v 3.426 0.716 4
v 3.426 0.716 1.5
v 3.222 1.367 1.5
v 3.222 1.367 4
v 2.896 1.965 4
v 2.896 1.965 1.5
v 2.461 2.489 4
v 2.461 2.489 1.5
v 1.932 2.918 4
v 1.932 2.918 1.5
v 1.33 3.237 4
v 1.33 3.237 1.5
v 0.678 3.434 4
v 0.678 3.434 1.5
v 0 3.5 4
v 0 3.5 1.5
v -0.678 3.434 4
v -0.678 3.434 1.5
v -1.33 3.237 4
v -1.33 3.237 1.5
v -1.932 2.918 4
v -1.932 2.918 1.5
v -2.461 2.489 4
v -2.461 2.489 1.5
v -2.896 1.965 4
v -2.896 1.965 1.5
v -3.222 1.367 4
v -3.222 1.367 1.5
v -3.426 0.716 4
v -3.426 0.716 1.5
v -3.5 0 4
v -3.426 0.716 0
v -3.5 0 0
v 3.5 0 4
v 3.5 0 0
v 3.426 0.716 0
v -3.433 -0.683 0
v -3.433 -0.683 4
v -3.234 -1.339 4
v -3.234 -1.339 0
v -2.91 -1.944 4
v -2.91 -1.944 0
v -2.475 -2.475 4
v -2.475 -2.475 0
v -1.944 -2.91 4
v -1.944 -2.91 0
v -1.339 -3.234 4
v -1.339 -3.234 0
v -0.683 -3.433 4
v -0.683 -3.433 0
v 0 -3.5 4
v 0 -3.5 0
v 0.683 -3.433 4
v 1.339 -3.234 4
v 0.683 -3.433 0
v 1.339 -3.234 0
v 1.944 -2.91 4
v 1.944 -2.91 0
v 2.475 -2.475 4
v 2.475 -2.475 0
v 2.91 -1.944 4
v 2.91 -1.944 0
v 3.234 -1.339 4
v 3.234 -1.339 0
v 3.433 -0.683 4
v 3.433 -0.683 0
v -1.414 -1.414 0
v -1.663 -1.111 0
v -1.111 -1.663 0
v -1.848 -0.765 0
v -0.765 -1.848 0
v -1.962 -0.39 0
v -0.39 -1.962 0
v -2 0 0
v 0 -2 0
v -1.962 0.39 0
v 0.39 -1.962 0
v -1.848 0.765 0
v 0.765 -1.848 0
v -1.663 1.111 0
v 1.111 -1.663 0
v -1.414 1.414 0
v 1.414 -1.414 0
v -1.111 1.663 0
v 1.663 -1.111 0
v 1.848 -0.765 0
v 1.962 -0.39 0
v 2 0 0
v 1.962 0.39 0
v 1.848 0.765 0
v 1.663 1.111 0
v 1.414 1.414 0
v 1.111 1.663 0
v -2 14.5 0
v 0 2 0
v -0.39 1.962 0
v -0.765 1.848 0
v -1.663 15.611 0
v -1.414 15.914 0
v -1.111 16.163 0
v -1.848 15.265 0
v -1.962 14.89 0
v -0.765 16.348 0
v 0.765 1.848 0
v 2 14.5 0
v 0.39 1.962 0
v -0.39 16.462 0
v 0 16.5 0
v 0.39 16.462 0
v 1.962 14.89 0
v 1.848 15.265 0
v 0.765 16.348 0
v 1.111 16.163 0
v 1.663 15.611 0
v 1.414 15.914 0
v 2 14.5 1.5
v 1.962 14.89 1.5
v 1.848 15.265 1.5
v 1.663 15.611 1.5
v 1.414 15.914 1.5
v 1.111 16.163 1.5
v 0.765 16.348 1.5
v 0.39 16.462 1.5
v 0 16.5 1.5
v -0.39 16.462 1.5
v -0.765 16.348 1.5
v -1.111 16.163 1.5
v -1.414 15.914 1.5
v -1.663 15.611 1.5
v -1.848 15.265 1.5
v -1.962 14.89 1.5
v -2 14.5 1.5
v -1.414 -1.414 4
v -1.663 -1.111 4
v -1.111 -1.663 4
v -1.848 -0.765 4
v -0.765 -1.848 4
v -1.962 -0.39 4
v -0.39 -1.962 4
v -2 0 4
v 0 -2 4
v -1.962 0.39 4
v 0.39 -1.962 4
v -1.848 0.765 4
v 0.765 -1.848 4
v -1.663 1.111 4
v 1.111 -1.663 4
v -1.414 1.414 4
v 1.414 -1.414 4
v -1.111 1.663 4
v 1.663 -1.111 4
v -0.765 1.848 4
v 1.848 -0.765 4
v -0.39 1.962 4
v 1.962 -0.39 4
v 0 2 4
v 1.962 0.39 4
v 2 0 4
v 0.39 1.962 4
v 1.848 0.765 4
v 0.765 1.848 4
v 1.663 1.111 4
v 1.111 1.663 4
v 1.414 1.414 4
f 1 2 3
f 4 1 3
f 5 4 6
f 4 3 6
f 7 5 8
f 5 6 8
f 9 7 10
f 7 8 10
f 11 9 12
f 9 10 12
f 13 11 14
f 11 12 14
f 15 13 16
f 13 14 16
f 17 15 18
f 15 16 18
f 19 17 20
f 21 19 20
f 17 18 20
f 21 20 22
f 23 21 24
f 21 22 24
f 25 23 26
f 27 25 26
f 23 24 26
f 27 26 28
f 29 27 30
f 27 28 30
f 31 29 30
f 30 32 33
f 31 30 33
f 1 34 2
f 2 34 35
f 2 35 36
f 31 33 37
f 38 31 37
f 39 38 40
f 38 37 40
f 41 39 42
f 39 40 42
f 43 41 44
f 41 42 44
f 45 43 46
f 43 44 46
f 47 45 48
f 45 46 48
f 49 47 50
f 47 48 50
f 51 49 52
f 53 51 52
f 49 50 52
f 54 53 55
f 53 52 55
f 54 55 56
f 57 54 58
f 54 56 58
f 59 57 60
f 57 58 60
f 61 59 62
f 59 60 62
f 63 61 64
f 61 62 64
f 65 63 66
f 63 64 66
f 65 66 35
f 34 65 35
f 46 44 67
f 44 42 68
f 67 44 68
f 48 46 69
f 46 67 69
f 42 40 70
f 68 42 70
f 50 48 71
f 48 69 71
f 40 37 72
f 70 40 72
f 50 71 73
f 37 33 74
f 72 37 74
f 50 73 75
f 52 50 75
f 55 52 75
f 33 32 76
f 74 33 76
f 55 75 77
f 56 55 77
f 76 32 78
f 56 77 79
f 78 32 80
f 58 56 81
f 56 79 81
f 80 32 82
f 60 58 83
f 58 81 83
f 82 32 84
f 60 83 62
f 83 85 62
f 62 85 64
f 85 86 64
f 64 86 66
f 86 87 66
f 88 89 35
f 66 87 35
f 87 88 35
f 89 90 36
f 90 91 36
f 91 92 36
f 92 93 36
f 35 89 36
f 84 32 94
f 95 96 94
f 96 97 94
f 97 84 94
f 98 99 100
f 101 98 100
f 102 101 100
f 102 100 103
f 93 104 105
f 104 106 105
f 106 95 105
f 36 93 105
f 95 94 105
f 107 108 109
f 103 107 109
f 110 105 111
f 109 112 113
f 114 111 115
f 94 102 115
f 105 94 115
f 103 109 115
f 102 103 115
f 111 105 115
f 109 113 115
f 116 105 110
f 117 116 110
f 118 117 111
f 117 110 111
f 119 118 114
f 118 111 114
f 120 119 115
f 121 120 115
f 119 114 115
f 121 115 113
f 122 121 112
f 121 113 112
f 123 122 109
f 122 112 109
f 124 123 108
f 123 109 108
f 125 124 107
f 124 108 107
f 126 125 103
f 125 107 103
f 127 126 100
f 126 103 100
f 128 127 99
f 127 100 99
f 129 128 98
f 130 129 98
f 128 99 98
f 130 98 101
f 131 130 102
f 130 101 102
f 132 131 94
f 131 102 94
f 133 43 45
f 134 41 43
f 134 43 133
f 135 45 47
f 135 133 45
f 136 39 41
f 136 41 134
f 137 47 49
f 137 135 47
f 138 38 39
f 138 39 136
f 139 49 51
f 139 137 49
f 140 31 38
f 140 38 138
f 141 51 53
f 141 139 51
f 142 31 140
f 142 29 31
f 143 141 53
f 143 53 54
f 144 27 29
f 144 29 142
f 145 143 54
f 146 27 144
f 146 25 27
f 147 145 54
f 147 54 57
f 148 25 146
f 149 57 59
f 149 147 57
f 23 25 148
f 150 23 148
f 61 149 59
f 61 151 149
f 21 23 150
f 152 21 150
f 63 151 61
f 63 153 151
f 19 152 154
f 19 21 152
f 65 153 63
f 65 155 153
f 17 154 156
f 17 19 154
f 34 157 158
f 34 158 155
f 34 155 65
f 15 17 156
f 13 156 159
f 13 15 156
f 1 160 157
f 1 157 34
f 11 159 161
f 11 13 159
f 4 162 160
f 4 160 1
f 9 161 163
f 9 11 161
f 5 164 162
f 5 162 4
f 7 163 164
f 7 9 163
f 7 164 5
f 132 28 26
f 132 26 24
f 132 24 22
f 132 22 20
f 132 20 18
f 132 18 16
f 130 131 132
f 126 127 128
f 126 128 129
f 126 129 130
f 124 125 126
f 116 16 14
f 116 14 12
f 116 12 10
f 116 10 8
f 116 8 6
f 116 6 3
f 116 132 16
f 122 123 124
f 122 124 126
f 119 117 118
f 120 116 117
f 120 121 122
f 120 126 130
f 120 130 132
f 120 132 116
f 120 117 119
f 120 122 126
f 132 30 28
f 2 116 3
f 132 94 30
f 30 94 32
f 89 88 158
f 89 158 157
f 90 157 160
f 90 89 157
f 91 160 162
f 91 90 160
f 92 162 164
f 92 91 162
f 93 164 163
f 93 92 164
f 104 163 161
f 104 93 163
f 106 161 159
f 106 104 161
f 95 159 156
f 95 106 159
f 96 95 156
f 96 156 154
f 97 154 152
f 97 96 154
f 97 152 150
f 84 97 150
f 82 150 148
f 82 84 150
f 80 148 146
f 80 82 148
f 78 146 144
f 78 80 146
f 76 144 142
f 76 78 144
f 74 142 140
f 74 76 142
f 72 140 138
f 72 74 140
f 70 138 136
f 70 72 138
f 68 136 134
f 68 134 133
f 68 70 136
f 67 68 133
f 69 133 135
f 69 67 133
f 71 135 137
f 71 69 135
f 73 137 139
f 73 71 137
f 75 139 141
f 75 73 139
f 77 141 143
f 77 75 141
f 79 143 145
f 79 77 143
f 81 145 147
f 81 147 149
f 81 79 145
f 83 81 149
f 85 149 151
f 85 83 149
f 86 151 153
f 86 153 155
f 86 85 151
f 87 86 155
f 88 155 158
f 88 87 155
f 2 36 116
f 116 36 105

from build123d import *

# Parameters (mm, degrees)
F1_DEPTH = 1.5
F0_R     = 2
F2_DEPTH = 4


with BuildPart() as f1:
    # F0 (on Top) → F1 (new body)
    with BuildSketch(Plane.XY):
        with BuildLine():
            ThreePointArc((2, 14.5), (0, 16.5), (-2, 14.5))
            ThreePointArc((-2, 14.5), (0, 12.5), (2, 14.5))
        make_face()
        with BuildLine():
            Line((-2, 14.5), (-3.4258823529, 0.7164705882))
            ThreePointArc((-3.4258823529, 0.7164705882), (0, 3.5), (3.4258823529, 0.7164705882))
            Line((3.4258823529, 0.7164705882), (2, 14.5))
            ThreePointArc((2, 14.5), (0, 12.5), (-2, 14.5))
        make_face()
    extrude(amount=F1_DEPTH)

    # F0 (on Top) → F2 (join)
    with BuildSketch(Plane.XY):
        with BuildLine():
            Line((-3.4258823529, 0.7164705882), (-3.5, 0))
            ThreePointArc((-3.5, 0), (0, -3.5), (3.5, 0))
            Line((3.5, 0), (3.4258823529, 0.7164705882))
            ThreePointArc((3.4258823529, 0.7164705882), (0, 3.5), (-3.4258823529, 0.7164705882))
        make_face()
        Circle(F0_R, mode=Mode.SUBTRACT)
    extrude(amount=F2_DEPTH)


solid = f1.part
